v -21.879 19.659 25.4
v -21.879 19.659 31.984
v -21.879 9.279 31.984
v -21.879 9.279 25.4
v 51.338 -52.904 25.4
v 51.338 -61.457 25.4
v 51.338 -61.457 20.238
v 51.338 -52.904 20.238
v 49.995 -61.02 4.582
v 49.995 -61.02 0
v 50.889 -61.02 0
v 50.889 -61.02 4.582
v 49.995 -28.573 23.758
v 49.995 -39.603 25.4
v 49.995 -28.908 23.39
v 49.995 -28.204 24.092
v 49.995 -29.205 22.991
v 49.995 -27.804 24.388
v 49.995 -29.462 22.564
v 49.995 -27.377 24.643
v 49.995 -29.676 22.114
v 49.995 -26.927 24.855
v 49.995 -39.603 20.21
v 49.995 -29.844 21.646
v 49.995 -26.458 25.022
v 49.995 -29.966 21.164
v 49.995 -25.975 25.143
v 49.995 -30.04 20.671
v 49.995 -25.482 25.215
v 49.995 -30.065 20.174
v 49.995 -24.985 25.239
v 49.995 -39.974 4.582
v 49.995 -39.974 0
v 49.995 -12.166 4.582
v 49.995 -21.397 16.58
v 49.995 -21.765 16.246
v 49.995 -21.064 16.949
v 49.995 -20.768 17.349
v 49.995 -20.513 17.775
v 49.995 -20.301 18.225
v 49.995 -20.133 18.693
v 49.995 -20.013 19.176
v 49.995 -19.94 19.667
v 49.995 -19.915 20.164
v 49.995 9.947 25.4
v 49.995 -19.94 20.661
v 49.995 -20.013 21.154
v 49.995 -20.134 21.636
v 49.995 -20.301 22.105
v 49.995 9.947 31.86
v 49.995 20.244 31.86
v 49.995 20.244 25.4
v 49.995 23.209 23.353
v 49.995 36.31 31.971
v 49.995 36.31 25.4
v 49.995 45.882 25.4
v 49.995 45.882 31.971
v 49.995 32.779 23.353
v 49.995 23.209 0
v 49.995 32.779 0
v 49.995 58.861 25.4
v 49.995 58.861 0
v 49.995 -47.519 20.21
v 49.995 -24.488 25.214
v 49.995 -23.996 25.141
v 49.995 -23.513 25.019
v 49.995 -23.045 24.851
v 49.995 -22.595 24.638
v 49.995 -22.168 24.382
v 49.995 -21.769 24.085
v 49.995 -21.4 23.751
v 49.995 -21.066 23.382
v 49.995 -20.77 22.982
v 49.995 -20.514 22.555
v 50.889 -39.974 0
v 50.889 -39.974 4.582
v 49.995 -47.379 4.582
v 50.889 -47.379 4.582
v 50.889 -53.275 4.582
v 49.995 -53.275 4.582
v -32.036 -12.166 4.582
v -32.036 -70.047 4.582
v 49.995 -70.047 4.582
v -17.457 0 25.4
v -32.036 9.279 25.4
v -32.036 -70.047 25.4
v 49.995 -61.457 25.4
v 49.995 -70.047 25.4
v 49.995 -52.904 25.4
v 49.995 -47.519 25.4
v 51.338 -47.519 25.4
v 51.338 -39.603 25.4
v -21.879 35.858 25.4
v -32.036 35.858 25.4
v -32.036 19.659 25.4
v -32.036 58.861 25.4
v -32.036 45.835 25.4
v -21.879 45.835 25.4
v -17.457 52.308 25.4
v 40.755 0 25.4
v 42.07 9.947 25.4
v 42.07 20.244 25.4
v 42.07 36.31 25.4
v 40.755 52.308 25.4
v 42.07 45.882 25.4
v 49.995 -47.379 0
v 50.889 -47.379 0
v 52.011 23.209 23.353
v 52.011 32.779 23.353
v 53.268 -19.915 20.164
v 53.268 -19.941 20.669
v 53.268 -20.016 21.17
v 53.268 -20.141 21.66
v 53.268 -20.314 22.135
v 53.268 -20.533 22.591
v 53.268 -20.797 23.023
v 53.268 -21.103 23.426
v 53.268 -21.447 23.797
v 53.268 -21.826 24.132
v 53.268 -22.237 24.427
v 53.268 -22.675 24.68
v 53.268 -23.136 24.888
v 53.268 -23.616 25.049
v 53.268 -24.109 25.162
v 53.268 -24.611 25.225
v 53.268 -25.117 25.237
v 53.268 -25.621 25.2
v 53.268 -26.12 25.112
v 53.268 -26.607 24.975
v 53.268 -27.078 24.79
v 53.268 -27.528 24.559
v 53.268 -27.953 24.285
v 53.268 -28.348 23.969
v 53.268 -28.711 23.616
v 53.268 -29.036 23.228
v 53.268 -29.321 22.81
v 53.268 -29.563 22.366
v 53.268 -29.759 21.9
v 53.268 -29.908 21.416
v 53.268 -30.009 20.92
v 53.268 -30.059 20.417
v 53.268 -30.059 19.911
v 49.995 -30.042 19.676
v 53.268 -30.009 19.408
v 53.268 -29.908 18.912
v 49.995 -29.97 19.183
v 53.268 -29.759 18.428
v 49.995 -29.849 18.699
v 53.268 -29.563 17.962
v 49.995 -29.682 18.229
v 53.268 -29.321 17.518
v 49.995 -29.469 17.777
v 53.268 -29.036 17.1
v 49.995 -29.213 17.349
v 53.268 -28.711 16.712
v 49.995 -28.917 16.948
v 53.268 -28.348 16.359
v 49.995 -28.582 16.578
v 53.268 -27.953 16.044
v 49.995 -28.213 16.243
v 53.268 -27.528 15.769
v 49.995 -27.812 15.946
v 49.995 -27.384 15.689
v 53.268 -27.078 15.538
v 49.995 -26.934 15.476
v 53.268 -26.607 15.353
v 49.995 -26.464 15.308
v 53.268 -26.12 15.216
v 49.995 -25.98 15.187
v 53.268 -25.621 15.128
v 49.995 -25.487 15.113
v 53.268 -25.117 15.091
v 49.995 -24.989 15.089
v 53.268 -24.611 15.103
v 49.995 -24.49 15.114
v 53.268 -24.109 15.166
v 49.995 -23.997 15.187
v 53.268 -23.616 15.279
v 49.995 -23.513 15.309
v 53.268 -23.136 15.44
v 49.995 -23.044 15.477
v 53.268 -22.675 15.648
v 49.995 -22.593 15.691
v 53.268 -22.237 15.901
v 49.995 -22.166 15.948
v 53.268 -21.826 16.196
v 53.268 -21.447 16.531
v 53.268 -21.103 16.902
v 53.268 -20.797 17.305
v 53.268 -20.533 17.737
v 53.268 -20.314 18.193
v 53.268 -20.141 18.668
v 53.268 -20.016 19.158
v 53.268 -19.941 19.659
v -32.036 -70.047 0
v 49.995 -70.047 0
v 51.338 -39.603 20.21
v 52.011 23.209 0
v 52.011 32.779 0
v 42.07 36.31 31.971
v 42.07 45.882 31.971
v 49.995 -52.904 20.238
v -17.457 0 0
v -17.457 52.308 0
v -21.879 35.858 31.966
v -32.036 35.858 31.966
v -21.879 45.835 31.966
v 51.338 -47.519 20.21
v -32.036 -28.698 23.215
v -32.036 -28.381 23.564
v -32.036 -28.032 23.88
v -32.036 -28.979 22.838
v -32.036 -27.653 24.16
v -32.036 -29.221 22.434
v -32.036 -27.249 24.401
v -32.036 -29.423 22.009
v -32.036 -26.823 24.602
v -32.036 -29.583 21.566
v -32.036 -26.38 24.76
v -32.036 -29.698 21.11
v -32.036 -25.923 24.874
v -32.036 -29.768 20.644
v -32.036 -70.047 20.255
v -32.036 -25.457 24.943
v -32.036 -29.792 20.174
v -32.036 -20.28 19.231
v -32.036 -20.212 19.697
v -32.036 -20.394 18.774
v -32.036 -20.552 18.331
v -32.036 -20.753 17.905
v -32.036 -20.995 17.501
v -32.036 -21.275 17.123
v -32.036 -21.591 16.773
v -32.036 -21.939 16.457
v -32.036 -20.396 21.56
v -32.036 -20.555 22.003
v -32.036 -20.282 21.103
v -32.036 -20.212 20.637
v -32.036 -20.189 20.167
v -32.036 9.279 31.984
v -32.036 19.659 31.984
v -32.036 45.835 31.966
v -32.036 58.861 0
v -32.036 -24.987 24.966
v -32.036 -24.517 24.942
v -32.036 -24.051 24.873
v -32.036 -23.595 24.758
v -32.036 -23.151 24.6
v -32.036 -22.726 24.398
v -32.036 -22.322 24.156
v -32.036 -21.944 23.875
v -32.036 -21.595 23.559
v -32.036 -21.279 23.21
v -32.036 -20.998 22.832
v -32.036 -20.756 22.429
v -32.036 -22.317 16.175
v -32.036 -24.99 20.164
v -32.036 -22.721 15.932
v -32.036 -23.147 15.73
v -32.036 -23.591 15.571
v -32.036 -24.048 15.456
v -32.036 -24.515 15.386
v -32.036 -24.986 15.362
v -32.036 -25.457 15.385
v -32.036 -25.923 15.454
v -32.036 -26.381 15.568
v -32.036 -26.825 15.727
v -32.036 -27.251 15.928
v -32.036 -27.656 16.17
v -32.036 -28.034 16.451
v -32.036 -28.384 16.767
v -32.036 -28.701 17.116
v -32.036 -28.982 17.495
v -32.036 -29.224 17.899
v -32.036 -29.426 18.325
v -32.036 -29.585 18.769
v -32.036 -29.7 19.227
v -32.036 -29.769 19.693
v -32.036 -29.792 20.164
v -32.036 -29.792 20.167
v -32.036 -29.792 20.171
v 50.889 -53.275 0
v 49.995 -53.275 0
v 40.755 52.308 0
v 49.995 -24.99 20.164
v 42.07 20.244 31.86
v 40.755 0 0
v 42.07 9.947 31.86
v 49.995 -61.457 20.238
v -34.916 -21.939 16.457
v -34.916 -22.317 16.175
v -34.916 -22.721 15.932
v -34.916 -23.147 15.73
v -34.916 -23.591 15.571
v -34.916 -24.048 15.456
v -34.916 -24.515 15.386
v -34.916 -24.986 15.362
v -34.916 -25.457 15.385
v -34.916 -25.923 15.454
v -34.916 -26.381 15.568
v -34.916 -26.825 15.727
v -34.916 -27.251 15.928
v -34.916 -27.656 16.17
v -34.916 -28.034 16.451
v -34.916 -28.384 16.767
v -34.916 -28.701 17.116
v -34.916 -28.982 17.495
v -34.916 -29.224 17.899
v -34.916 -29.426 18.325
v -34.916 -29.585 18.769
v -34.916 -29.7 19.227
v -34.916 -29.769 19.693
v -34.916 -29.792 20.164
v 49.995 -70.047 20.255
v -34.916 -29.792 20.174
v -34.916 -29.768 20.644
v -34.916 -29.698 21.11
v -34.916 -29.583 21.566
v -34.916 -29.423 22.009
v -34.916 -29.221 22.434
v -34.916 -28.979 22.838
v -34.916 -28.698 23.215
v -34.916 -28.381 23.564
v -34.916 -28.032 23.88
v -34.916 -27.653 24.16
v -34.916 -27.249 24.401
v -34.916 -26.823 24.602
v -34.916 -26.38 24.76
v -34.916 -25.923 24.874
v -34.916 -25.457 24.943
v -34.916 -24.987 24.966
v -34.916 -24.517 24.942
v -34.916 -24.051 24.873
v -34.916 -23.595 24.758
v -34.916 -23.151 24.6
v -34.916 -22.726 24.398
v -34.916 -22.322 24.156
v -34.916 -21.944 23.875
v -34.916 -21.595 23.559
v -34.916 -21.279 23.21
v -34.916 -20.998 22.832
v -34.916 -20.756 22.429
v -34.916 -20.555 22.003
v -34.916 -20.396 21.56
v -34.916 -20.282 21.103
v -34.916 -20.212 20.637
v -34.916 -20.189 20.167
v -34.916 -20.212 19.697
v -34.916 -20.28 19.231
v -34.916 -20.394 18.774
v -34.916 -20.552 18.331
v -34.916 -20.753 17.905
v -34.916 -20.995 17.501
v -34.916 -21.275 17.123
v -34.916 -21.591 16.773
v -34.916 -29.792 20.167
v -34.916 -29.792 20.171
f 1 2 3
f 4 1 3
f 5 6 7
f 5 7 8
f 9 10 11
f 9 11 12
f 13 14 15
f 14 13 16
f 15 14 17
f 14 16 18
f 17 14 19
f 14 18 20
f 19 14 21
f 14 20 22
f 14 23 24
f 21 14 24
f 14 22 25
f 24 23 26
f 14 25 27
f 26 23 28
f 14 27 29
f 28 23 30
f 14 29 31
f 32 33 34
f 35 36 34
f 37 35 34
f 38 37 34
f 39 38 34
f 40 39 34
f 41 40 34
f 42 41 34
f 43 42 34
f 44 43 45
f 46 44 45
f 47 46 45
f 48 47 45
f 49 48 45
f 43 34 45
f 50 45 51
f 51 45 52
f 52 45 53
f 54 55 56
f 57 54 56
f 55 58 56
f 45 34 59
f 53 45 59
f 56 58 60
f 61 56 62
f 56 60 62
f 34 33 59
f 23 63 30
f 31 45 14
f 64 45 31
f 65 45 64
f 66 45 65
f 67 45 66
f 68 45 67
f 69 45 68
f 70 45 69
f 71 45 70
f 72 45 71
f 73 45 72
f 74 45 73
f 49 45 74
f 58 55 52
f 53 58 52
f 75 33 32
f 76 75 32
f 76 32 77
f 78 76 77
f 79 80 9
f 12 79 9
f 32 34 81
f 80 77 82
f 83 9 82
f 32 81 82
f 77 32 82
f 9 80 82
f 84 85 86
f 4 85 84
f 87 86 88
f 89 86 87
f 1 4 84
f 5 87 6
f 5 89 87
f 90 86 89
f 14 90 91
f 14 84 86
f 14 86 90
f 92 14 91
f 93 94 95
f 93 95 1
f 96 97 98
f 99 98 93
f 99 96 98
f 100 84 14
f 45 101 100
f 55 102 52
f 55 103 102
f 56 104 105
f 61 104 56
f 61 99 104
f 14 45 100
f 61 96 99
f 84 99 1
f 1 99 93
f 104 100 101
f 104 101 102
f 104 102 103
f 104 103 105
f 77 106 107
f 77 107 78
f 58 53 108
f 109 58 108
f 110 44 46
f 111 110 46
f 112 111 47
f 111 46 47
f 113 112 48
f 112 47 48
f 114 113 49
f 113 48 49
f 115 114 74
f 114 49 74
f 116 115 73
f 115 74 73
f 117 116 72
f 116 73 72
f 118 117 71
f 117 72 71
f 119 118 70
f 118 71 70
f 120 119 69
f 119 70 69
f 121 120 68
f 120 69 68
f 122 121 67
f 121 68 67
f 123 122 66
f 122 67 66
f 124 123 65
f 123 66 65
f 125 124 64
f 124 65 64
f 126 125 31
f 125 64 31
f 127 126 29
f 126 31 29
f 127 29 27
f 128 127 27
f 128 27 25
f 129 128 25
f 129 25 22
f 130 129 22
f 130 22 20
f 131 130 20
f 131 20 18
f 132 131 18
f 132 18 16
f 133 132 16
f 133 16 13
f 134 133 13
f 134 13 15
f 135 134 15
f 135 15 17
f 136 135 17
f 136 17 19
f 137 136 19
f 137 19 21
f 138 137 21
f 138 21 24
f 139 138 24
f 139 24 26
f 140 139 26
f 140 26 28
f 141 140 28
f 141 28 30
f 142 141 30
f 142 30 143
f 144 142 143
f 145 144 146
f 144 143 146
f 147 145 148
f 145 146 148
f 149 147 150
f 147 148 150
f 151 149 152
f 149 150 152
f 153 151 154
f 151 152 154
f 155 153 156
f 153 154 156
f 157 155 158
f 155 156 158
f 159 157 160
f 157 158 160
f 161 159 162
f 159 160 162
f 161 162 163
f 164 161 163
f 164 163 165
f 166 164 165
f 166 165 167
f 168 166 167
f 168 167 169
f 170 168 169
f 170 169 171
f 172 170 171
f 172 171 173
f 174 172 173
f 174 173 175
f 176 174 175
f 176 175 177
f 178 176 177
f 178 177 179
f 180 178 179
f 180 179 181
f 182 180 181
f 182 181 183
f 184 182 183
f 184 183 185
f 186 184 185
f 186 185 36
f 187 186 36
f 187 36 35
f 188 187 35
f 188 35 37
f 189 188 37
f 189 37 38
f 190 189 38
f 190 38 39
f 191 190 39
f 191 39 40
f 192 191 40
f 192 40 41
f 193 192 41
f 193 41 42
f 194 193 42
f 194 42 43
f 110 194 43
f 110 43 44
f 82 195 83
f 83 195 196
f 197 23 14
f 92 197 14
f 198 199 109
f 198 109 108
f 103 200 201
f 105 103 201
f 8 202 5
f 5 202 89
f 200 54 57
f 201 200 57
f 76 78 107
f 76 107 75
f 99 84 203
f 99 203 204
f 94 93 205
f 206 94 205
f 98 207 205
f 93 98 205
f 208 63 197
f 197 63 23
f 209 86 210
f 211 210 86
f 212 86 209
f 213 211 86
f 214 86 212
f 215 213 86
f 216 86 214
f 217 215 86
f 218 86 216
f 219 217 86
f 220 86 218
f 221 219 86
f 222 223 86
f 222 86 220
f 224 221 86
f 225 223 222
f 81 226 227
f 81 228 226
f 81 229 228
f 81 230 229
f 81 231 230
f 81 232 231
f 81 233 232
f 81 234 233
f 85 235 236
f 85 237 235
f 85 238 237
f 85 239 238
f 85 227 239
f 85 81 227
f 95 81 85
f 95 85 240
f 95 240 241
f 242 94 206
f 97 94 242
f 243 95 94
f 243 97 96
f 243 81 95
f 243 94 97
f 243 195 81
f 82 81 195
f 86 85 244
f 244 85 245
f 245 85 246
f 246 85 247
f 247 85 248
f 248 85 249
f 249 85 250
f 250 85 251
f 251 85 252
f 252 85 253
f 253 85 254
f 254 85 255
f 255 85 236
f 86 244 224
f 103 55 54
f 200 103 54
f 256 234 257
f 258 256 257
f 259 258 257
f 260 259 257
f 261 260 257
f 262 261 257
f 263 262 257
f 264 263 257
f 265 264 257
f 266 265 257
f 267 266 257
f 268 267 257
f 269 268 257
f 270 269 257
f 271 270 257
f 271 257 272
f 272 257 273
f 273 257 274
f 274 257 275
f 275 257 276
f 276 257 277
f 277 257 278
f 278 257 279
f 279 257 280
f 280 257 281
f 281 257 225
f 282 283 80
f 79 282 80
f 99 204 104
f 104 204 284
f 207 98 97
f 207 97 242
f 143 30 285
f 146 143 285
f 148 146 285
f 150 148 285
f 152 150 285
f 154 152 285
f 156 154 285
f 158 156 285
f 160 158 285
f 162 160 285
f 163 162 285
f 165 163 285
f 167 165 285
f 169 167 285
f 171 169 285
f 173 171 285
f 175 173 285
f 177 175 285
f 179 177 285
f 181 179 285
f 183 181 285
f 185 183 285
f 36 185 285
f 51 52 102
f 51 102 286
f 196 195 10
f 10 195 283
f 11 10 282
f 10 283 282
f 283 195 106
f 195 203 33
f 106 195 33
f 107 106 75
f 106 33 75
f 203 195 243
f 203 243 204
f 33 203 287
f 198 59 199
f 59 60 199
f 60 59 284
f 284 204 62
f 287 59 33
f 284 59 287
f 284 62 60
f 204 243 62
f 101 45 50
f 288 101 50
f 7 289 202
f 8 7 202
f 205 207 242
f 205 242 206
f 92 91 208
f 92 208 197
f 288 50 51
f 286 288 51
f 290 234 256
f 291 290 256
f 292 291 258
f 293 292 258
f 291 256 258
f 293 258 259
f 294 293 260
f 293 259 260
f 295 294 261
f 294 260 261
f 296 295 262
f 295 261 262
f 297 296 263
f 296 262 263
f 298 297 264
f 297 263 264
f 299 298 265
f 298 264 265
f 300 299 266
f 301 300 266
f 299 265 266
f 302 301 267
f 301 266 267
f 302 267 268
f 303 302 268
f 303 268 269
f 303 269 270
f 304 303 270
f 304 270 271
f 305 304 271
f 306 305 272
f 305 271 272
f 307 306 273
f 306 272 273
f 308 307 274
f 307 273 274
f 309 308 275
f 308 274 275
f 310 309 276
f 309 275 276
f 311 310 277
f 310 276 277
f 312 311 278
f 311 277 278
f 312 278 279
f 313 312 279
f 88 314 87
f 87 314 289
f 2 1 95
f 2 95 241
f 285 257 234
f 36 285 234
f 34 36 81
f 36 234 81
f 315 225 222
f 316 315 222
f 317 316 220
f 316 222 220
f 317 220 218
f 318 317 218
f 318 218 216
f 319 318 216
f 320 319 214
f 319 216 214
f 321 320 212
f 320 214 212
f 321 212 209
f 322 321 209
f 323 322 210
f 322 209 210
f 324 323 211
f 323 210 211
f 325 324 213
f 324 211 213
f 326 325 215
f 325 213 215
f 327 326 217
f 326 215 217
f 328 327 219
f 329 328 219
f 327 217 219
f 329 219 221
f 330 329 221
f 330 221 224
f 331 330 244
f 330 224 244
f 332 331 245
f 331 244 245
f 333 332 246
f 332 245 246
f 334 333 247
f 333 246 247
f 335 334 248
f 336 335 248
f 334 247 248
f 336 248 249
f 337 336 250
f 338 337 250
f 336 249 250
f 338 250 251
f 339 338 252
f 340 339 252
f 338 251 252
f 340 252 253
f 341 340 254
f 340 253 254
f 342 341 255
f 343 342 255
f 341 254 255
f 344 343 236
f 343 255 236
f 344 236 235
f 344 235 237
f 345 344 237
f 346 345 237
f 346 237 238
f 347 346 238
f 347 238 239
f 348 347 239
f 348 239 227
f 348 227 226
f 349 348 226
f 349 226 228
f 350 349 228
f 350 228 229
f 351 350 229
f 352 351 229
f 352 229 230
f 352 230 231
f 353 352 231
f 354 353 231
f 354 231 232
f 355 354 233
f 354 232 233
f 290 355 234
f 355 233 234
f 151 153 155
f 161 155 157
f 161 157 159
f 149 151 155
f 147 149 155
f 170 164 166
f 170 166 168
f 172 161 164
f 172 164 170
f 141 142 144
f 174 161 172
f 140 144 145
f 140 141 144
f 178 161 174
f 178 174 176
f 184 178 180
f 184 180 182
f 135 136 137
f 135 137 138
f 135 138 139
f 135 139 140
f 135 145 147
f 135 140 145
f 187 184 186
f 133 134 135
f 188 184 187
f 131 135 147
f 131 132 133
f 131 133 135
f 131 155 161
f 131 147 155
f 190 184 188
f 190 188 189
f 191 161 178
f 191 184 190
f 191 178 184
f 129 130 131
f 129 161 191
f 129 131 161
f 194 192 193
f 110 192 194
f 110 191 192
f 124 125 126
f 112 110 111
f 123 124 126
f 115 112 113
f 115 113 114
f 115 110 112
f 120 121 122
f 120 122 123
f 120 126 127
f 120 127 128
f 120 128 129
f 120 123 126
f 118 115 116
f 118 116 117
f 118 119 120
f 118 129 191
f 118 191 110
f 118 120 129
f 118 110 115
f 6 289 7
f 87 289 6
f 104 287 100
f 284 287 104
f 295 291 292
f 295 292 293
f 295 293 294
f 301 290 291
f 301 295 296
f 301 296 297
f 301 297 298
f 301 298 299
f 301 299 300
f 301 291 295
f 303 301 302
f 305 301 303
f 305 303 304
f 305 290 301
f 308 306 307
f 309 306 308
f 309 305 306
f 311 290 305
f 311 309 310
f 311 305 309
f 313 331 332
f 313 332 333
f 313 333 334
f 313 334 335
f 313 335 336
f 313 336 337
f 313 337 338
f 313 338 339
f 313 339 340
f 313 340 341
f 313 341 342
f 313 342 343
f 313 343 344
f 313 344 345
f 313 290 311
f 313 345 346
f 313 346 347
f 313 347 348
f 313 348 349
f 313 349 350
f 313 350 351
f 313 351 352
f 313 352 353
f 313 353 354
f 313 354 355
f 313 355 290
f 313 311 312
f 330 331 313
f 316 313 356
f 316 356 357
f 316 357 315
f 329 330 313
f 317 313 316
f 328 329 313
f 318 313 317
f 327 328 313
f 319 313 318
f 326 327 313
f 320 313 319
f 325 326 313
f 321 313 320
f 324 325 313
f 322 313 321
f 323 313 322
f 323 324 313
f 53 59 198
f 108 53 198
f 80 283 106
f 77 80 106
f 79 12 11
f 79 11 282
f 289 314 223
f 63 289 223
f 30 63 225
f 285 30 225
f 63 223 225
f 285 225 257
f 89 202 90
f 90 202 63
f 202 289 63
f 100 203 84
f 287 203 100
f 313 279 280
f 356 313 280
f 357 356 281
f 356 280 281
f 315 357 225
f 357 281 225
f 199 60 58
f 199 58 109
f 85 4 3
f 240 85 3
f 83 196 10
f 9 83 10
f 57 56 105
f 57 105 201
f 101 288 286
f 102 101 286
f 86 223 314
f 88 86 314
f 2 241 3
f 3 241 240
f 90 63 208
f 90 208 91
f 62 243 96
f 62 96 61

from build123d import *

# Parameters (mm, degrees)
F0_W       = 82.0303186774
F0_H       = 128.9077922702
F0_W_2     = 61.4851098508
F0_H_2     = 52.307818085
F1_DEPTH   = 25.4
F3_DEPTH   = 103.3353582025
F4_W       = 9.9767372012
F4_H       = 6.5656021893
F4_W_2     = 10.380640626
F4_H_2     = 6.5844875485
F5_DEPTH   = 10.1564340293
F6_W       = 10.2968784049
F6_H       = 6.4595692515
F7_W       = 9.5716901124
F7_H       = 6.5711081684
F8_DEPTH   = 7.9249968985
F9_W       = 8.5524487155
F9_H       = 5.1620816675
F9_W_2     = 7.9160258174
F9_H_2     = 5.1903103754
F10_DEPTH  = 1.3433820568
F11_W      = 7.7443979681
F11_H      = 4.5824625995
F11_W_2    = 7.4055045843
F12_DEPTH  = 0.893893186
F14_DEPTH  = 2.8803441674
F15_R      = 5.0749608974
F1_FACE2_W = 52.307818085
F1_FACE2_H = 25.4
F16_DEPTH  = 3.2730977982
F17_W      = 2.0163990557
F17_H      = 9.5695778728
F18_DEPTH  = 23.3533121645


with BuildPart() as f1:
    # F0 (on Top) → F1 (new body)
    with BuildSketch(Plane.XY):
        with Locations((8.9795850217, -5.5929608643)):
            Rectangle(F0_W, F0_H)
        with Locations((10.0128157064, 26.1539090425)):
            Rectangle(F0_W_2, F0_H_2, mode=Mode.SUBTRACT)
    extrude(amount=F1_DEPTH)

    # F2 (on face) → F3 (cut)
    with BuildSketch(Plane(origin=(-32.035574317, 0, 0), x_dir=(0, -1, 0), z_dir=(-1, 0, 0))):
        Polygon((70.0468569994, 4.5824625995), (70.0468569994, 20.2553160489), (24.9904096127, 20.1640632004), (12.1657857671, 4.5824625995), align=None)
    extrude(amount=-F3_DEPTH, mode=Mode.SUBTRACT)

    # F4 (on face) → F5 (join)
    with BuildSketch(Plane(origin=(-32.035574317, 0, 0), x_dir=(0, -1, 0), z_dir=(-1, 0, 0))):
        with Locations((-40.8467017114, 28.6828010947)):
            Rectangle(F4_W, F4_H)
        with Locations((-14.4690144807, 28.6922437742)):
            Rectangle(F4_W_2, F4_H_2)
    extrude(amount=-F5_DEPTH)

    # F6 (on face) + F7 (on face) → F8 (join)
    with BuildSketch(Plane.YZ.offset(49.9947443604)):
        with Locations((15.0959282182, 28.6297846258)):
            Rectangle(F6_W, F6_H)
    with BuildSketch(Plane.YZ.offset(49.9947443604)):
        with Locations((41.0959366709, 28.6855540842)):
            Rectangle(F7_W, F7_H)
    extrude(amount=-F8_DEPTH)

    # F9 (on face) → F10 (join)
    with BuildSketch(Plane.YZ.offset(49.9947443604)):
        with Locations((-57.180442793, 22.8189591662)):
            Rectangle(F9_W, F9_H)
        with Locations((-43.5606203973, 22.8048448123)):
            Rectangle(F9_W_2, F9_H_2)
    extrude(amount=F10_DEPTH)

    # F11 (on face) → F12 (join)
    with BuildSketch(Plane.YZ.offset(49.9947443604)):
        with Locations((-57.1476463228, 2.2912312998)):
            Rectangle(F11_W, F11_H)
        with Locations((-43.6765104532, 2.2912312998)):
            Rectangle(F11_W_2, F11_H)
    extrude(amount=F12_DEPTH)

    # F13 (on face) → F14 (join)
    with BuildSketch(Plane(origin=(-32.035574317, 0, 0), x_dir=(0, -1, 0), z_dir=(-1, 0, 0))):
        with BuildLine():
            Line((24.9904096127, 20.1640632004), (29.7919796658, 20.1737878229))
            ThreePointArc((29.7919796658, 20.1737878229), (22.9361613671, 24.5040209985), (21.9390430586, 16.4567283495))
            Line((21.9390430586, 16.4567283495), (24.9904096127, 20.1640632004))
        make_face()
        with BuildLine():
            ThreePointArc((21.9390430586, 16.4567283495), (27.0402619522, 15.8220273956), (29.7919895134, 20.1640632004))
            ThreePointArc((29.7919895134, 20.1640632004), (29.7919870515, 20.1689255141), (29.7919796658, 20.1737878229))
            Line((29.7919796658, 20.1737878229), (24.9904096127, 20.1640632004))
            Line((24.9904096127, 20.1640632004), (21.9390430586, 16.4567283495))
        make_face()
    extrude(amount=F14_DEPTH)

    # F15 (on face) + F1_face2 (on face) → F16 (join)
    with BuildSketch(Plane.YZ.offset(49.9947443604)):
        with Locations((-24.9904096127, 20.1640632004)):
            Circle(F15_R)
    with BuildSketch(Plane(origin=(-20.729739219, 26.1539090425, 12.7), x_dir=(0, 1, 0), z_dir=(1, 0, 0))):
        Rectangle(F1_FACE2_W, F1_FACE2_H)
    extrude(amount=F16_DEPTH)

    # F17 (on face) → F18 (join)
    with BuildSketch(Plane(origin=(0, 0, 0), x_dir=(1, 0, 0), z_dir=(0, 0, -1))):
        with Locations((51.0029438883, -27.9941596091)):
            Rectangle(F17_W, F17_H)
    extrude(amount=-F18_DEPTH)


solid = f1.part
